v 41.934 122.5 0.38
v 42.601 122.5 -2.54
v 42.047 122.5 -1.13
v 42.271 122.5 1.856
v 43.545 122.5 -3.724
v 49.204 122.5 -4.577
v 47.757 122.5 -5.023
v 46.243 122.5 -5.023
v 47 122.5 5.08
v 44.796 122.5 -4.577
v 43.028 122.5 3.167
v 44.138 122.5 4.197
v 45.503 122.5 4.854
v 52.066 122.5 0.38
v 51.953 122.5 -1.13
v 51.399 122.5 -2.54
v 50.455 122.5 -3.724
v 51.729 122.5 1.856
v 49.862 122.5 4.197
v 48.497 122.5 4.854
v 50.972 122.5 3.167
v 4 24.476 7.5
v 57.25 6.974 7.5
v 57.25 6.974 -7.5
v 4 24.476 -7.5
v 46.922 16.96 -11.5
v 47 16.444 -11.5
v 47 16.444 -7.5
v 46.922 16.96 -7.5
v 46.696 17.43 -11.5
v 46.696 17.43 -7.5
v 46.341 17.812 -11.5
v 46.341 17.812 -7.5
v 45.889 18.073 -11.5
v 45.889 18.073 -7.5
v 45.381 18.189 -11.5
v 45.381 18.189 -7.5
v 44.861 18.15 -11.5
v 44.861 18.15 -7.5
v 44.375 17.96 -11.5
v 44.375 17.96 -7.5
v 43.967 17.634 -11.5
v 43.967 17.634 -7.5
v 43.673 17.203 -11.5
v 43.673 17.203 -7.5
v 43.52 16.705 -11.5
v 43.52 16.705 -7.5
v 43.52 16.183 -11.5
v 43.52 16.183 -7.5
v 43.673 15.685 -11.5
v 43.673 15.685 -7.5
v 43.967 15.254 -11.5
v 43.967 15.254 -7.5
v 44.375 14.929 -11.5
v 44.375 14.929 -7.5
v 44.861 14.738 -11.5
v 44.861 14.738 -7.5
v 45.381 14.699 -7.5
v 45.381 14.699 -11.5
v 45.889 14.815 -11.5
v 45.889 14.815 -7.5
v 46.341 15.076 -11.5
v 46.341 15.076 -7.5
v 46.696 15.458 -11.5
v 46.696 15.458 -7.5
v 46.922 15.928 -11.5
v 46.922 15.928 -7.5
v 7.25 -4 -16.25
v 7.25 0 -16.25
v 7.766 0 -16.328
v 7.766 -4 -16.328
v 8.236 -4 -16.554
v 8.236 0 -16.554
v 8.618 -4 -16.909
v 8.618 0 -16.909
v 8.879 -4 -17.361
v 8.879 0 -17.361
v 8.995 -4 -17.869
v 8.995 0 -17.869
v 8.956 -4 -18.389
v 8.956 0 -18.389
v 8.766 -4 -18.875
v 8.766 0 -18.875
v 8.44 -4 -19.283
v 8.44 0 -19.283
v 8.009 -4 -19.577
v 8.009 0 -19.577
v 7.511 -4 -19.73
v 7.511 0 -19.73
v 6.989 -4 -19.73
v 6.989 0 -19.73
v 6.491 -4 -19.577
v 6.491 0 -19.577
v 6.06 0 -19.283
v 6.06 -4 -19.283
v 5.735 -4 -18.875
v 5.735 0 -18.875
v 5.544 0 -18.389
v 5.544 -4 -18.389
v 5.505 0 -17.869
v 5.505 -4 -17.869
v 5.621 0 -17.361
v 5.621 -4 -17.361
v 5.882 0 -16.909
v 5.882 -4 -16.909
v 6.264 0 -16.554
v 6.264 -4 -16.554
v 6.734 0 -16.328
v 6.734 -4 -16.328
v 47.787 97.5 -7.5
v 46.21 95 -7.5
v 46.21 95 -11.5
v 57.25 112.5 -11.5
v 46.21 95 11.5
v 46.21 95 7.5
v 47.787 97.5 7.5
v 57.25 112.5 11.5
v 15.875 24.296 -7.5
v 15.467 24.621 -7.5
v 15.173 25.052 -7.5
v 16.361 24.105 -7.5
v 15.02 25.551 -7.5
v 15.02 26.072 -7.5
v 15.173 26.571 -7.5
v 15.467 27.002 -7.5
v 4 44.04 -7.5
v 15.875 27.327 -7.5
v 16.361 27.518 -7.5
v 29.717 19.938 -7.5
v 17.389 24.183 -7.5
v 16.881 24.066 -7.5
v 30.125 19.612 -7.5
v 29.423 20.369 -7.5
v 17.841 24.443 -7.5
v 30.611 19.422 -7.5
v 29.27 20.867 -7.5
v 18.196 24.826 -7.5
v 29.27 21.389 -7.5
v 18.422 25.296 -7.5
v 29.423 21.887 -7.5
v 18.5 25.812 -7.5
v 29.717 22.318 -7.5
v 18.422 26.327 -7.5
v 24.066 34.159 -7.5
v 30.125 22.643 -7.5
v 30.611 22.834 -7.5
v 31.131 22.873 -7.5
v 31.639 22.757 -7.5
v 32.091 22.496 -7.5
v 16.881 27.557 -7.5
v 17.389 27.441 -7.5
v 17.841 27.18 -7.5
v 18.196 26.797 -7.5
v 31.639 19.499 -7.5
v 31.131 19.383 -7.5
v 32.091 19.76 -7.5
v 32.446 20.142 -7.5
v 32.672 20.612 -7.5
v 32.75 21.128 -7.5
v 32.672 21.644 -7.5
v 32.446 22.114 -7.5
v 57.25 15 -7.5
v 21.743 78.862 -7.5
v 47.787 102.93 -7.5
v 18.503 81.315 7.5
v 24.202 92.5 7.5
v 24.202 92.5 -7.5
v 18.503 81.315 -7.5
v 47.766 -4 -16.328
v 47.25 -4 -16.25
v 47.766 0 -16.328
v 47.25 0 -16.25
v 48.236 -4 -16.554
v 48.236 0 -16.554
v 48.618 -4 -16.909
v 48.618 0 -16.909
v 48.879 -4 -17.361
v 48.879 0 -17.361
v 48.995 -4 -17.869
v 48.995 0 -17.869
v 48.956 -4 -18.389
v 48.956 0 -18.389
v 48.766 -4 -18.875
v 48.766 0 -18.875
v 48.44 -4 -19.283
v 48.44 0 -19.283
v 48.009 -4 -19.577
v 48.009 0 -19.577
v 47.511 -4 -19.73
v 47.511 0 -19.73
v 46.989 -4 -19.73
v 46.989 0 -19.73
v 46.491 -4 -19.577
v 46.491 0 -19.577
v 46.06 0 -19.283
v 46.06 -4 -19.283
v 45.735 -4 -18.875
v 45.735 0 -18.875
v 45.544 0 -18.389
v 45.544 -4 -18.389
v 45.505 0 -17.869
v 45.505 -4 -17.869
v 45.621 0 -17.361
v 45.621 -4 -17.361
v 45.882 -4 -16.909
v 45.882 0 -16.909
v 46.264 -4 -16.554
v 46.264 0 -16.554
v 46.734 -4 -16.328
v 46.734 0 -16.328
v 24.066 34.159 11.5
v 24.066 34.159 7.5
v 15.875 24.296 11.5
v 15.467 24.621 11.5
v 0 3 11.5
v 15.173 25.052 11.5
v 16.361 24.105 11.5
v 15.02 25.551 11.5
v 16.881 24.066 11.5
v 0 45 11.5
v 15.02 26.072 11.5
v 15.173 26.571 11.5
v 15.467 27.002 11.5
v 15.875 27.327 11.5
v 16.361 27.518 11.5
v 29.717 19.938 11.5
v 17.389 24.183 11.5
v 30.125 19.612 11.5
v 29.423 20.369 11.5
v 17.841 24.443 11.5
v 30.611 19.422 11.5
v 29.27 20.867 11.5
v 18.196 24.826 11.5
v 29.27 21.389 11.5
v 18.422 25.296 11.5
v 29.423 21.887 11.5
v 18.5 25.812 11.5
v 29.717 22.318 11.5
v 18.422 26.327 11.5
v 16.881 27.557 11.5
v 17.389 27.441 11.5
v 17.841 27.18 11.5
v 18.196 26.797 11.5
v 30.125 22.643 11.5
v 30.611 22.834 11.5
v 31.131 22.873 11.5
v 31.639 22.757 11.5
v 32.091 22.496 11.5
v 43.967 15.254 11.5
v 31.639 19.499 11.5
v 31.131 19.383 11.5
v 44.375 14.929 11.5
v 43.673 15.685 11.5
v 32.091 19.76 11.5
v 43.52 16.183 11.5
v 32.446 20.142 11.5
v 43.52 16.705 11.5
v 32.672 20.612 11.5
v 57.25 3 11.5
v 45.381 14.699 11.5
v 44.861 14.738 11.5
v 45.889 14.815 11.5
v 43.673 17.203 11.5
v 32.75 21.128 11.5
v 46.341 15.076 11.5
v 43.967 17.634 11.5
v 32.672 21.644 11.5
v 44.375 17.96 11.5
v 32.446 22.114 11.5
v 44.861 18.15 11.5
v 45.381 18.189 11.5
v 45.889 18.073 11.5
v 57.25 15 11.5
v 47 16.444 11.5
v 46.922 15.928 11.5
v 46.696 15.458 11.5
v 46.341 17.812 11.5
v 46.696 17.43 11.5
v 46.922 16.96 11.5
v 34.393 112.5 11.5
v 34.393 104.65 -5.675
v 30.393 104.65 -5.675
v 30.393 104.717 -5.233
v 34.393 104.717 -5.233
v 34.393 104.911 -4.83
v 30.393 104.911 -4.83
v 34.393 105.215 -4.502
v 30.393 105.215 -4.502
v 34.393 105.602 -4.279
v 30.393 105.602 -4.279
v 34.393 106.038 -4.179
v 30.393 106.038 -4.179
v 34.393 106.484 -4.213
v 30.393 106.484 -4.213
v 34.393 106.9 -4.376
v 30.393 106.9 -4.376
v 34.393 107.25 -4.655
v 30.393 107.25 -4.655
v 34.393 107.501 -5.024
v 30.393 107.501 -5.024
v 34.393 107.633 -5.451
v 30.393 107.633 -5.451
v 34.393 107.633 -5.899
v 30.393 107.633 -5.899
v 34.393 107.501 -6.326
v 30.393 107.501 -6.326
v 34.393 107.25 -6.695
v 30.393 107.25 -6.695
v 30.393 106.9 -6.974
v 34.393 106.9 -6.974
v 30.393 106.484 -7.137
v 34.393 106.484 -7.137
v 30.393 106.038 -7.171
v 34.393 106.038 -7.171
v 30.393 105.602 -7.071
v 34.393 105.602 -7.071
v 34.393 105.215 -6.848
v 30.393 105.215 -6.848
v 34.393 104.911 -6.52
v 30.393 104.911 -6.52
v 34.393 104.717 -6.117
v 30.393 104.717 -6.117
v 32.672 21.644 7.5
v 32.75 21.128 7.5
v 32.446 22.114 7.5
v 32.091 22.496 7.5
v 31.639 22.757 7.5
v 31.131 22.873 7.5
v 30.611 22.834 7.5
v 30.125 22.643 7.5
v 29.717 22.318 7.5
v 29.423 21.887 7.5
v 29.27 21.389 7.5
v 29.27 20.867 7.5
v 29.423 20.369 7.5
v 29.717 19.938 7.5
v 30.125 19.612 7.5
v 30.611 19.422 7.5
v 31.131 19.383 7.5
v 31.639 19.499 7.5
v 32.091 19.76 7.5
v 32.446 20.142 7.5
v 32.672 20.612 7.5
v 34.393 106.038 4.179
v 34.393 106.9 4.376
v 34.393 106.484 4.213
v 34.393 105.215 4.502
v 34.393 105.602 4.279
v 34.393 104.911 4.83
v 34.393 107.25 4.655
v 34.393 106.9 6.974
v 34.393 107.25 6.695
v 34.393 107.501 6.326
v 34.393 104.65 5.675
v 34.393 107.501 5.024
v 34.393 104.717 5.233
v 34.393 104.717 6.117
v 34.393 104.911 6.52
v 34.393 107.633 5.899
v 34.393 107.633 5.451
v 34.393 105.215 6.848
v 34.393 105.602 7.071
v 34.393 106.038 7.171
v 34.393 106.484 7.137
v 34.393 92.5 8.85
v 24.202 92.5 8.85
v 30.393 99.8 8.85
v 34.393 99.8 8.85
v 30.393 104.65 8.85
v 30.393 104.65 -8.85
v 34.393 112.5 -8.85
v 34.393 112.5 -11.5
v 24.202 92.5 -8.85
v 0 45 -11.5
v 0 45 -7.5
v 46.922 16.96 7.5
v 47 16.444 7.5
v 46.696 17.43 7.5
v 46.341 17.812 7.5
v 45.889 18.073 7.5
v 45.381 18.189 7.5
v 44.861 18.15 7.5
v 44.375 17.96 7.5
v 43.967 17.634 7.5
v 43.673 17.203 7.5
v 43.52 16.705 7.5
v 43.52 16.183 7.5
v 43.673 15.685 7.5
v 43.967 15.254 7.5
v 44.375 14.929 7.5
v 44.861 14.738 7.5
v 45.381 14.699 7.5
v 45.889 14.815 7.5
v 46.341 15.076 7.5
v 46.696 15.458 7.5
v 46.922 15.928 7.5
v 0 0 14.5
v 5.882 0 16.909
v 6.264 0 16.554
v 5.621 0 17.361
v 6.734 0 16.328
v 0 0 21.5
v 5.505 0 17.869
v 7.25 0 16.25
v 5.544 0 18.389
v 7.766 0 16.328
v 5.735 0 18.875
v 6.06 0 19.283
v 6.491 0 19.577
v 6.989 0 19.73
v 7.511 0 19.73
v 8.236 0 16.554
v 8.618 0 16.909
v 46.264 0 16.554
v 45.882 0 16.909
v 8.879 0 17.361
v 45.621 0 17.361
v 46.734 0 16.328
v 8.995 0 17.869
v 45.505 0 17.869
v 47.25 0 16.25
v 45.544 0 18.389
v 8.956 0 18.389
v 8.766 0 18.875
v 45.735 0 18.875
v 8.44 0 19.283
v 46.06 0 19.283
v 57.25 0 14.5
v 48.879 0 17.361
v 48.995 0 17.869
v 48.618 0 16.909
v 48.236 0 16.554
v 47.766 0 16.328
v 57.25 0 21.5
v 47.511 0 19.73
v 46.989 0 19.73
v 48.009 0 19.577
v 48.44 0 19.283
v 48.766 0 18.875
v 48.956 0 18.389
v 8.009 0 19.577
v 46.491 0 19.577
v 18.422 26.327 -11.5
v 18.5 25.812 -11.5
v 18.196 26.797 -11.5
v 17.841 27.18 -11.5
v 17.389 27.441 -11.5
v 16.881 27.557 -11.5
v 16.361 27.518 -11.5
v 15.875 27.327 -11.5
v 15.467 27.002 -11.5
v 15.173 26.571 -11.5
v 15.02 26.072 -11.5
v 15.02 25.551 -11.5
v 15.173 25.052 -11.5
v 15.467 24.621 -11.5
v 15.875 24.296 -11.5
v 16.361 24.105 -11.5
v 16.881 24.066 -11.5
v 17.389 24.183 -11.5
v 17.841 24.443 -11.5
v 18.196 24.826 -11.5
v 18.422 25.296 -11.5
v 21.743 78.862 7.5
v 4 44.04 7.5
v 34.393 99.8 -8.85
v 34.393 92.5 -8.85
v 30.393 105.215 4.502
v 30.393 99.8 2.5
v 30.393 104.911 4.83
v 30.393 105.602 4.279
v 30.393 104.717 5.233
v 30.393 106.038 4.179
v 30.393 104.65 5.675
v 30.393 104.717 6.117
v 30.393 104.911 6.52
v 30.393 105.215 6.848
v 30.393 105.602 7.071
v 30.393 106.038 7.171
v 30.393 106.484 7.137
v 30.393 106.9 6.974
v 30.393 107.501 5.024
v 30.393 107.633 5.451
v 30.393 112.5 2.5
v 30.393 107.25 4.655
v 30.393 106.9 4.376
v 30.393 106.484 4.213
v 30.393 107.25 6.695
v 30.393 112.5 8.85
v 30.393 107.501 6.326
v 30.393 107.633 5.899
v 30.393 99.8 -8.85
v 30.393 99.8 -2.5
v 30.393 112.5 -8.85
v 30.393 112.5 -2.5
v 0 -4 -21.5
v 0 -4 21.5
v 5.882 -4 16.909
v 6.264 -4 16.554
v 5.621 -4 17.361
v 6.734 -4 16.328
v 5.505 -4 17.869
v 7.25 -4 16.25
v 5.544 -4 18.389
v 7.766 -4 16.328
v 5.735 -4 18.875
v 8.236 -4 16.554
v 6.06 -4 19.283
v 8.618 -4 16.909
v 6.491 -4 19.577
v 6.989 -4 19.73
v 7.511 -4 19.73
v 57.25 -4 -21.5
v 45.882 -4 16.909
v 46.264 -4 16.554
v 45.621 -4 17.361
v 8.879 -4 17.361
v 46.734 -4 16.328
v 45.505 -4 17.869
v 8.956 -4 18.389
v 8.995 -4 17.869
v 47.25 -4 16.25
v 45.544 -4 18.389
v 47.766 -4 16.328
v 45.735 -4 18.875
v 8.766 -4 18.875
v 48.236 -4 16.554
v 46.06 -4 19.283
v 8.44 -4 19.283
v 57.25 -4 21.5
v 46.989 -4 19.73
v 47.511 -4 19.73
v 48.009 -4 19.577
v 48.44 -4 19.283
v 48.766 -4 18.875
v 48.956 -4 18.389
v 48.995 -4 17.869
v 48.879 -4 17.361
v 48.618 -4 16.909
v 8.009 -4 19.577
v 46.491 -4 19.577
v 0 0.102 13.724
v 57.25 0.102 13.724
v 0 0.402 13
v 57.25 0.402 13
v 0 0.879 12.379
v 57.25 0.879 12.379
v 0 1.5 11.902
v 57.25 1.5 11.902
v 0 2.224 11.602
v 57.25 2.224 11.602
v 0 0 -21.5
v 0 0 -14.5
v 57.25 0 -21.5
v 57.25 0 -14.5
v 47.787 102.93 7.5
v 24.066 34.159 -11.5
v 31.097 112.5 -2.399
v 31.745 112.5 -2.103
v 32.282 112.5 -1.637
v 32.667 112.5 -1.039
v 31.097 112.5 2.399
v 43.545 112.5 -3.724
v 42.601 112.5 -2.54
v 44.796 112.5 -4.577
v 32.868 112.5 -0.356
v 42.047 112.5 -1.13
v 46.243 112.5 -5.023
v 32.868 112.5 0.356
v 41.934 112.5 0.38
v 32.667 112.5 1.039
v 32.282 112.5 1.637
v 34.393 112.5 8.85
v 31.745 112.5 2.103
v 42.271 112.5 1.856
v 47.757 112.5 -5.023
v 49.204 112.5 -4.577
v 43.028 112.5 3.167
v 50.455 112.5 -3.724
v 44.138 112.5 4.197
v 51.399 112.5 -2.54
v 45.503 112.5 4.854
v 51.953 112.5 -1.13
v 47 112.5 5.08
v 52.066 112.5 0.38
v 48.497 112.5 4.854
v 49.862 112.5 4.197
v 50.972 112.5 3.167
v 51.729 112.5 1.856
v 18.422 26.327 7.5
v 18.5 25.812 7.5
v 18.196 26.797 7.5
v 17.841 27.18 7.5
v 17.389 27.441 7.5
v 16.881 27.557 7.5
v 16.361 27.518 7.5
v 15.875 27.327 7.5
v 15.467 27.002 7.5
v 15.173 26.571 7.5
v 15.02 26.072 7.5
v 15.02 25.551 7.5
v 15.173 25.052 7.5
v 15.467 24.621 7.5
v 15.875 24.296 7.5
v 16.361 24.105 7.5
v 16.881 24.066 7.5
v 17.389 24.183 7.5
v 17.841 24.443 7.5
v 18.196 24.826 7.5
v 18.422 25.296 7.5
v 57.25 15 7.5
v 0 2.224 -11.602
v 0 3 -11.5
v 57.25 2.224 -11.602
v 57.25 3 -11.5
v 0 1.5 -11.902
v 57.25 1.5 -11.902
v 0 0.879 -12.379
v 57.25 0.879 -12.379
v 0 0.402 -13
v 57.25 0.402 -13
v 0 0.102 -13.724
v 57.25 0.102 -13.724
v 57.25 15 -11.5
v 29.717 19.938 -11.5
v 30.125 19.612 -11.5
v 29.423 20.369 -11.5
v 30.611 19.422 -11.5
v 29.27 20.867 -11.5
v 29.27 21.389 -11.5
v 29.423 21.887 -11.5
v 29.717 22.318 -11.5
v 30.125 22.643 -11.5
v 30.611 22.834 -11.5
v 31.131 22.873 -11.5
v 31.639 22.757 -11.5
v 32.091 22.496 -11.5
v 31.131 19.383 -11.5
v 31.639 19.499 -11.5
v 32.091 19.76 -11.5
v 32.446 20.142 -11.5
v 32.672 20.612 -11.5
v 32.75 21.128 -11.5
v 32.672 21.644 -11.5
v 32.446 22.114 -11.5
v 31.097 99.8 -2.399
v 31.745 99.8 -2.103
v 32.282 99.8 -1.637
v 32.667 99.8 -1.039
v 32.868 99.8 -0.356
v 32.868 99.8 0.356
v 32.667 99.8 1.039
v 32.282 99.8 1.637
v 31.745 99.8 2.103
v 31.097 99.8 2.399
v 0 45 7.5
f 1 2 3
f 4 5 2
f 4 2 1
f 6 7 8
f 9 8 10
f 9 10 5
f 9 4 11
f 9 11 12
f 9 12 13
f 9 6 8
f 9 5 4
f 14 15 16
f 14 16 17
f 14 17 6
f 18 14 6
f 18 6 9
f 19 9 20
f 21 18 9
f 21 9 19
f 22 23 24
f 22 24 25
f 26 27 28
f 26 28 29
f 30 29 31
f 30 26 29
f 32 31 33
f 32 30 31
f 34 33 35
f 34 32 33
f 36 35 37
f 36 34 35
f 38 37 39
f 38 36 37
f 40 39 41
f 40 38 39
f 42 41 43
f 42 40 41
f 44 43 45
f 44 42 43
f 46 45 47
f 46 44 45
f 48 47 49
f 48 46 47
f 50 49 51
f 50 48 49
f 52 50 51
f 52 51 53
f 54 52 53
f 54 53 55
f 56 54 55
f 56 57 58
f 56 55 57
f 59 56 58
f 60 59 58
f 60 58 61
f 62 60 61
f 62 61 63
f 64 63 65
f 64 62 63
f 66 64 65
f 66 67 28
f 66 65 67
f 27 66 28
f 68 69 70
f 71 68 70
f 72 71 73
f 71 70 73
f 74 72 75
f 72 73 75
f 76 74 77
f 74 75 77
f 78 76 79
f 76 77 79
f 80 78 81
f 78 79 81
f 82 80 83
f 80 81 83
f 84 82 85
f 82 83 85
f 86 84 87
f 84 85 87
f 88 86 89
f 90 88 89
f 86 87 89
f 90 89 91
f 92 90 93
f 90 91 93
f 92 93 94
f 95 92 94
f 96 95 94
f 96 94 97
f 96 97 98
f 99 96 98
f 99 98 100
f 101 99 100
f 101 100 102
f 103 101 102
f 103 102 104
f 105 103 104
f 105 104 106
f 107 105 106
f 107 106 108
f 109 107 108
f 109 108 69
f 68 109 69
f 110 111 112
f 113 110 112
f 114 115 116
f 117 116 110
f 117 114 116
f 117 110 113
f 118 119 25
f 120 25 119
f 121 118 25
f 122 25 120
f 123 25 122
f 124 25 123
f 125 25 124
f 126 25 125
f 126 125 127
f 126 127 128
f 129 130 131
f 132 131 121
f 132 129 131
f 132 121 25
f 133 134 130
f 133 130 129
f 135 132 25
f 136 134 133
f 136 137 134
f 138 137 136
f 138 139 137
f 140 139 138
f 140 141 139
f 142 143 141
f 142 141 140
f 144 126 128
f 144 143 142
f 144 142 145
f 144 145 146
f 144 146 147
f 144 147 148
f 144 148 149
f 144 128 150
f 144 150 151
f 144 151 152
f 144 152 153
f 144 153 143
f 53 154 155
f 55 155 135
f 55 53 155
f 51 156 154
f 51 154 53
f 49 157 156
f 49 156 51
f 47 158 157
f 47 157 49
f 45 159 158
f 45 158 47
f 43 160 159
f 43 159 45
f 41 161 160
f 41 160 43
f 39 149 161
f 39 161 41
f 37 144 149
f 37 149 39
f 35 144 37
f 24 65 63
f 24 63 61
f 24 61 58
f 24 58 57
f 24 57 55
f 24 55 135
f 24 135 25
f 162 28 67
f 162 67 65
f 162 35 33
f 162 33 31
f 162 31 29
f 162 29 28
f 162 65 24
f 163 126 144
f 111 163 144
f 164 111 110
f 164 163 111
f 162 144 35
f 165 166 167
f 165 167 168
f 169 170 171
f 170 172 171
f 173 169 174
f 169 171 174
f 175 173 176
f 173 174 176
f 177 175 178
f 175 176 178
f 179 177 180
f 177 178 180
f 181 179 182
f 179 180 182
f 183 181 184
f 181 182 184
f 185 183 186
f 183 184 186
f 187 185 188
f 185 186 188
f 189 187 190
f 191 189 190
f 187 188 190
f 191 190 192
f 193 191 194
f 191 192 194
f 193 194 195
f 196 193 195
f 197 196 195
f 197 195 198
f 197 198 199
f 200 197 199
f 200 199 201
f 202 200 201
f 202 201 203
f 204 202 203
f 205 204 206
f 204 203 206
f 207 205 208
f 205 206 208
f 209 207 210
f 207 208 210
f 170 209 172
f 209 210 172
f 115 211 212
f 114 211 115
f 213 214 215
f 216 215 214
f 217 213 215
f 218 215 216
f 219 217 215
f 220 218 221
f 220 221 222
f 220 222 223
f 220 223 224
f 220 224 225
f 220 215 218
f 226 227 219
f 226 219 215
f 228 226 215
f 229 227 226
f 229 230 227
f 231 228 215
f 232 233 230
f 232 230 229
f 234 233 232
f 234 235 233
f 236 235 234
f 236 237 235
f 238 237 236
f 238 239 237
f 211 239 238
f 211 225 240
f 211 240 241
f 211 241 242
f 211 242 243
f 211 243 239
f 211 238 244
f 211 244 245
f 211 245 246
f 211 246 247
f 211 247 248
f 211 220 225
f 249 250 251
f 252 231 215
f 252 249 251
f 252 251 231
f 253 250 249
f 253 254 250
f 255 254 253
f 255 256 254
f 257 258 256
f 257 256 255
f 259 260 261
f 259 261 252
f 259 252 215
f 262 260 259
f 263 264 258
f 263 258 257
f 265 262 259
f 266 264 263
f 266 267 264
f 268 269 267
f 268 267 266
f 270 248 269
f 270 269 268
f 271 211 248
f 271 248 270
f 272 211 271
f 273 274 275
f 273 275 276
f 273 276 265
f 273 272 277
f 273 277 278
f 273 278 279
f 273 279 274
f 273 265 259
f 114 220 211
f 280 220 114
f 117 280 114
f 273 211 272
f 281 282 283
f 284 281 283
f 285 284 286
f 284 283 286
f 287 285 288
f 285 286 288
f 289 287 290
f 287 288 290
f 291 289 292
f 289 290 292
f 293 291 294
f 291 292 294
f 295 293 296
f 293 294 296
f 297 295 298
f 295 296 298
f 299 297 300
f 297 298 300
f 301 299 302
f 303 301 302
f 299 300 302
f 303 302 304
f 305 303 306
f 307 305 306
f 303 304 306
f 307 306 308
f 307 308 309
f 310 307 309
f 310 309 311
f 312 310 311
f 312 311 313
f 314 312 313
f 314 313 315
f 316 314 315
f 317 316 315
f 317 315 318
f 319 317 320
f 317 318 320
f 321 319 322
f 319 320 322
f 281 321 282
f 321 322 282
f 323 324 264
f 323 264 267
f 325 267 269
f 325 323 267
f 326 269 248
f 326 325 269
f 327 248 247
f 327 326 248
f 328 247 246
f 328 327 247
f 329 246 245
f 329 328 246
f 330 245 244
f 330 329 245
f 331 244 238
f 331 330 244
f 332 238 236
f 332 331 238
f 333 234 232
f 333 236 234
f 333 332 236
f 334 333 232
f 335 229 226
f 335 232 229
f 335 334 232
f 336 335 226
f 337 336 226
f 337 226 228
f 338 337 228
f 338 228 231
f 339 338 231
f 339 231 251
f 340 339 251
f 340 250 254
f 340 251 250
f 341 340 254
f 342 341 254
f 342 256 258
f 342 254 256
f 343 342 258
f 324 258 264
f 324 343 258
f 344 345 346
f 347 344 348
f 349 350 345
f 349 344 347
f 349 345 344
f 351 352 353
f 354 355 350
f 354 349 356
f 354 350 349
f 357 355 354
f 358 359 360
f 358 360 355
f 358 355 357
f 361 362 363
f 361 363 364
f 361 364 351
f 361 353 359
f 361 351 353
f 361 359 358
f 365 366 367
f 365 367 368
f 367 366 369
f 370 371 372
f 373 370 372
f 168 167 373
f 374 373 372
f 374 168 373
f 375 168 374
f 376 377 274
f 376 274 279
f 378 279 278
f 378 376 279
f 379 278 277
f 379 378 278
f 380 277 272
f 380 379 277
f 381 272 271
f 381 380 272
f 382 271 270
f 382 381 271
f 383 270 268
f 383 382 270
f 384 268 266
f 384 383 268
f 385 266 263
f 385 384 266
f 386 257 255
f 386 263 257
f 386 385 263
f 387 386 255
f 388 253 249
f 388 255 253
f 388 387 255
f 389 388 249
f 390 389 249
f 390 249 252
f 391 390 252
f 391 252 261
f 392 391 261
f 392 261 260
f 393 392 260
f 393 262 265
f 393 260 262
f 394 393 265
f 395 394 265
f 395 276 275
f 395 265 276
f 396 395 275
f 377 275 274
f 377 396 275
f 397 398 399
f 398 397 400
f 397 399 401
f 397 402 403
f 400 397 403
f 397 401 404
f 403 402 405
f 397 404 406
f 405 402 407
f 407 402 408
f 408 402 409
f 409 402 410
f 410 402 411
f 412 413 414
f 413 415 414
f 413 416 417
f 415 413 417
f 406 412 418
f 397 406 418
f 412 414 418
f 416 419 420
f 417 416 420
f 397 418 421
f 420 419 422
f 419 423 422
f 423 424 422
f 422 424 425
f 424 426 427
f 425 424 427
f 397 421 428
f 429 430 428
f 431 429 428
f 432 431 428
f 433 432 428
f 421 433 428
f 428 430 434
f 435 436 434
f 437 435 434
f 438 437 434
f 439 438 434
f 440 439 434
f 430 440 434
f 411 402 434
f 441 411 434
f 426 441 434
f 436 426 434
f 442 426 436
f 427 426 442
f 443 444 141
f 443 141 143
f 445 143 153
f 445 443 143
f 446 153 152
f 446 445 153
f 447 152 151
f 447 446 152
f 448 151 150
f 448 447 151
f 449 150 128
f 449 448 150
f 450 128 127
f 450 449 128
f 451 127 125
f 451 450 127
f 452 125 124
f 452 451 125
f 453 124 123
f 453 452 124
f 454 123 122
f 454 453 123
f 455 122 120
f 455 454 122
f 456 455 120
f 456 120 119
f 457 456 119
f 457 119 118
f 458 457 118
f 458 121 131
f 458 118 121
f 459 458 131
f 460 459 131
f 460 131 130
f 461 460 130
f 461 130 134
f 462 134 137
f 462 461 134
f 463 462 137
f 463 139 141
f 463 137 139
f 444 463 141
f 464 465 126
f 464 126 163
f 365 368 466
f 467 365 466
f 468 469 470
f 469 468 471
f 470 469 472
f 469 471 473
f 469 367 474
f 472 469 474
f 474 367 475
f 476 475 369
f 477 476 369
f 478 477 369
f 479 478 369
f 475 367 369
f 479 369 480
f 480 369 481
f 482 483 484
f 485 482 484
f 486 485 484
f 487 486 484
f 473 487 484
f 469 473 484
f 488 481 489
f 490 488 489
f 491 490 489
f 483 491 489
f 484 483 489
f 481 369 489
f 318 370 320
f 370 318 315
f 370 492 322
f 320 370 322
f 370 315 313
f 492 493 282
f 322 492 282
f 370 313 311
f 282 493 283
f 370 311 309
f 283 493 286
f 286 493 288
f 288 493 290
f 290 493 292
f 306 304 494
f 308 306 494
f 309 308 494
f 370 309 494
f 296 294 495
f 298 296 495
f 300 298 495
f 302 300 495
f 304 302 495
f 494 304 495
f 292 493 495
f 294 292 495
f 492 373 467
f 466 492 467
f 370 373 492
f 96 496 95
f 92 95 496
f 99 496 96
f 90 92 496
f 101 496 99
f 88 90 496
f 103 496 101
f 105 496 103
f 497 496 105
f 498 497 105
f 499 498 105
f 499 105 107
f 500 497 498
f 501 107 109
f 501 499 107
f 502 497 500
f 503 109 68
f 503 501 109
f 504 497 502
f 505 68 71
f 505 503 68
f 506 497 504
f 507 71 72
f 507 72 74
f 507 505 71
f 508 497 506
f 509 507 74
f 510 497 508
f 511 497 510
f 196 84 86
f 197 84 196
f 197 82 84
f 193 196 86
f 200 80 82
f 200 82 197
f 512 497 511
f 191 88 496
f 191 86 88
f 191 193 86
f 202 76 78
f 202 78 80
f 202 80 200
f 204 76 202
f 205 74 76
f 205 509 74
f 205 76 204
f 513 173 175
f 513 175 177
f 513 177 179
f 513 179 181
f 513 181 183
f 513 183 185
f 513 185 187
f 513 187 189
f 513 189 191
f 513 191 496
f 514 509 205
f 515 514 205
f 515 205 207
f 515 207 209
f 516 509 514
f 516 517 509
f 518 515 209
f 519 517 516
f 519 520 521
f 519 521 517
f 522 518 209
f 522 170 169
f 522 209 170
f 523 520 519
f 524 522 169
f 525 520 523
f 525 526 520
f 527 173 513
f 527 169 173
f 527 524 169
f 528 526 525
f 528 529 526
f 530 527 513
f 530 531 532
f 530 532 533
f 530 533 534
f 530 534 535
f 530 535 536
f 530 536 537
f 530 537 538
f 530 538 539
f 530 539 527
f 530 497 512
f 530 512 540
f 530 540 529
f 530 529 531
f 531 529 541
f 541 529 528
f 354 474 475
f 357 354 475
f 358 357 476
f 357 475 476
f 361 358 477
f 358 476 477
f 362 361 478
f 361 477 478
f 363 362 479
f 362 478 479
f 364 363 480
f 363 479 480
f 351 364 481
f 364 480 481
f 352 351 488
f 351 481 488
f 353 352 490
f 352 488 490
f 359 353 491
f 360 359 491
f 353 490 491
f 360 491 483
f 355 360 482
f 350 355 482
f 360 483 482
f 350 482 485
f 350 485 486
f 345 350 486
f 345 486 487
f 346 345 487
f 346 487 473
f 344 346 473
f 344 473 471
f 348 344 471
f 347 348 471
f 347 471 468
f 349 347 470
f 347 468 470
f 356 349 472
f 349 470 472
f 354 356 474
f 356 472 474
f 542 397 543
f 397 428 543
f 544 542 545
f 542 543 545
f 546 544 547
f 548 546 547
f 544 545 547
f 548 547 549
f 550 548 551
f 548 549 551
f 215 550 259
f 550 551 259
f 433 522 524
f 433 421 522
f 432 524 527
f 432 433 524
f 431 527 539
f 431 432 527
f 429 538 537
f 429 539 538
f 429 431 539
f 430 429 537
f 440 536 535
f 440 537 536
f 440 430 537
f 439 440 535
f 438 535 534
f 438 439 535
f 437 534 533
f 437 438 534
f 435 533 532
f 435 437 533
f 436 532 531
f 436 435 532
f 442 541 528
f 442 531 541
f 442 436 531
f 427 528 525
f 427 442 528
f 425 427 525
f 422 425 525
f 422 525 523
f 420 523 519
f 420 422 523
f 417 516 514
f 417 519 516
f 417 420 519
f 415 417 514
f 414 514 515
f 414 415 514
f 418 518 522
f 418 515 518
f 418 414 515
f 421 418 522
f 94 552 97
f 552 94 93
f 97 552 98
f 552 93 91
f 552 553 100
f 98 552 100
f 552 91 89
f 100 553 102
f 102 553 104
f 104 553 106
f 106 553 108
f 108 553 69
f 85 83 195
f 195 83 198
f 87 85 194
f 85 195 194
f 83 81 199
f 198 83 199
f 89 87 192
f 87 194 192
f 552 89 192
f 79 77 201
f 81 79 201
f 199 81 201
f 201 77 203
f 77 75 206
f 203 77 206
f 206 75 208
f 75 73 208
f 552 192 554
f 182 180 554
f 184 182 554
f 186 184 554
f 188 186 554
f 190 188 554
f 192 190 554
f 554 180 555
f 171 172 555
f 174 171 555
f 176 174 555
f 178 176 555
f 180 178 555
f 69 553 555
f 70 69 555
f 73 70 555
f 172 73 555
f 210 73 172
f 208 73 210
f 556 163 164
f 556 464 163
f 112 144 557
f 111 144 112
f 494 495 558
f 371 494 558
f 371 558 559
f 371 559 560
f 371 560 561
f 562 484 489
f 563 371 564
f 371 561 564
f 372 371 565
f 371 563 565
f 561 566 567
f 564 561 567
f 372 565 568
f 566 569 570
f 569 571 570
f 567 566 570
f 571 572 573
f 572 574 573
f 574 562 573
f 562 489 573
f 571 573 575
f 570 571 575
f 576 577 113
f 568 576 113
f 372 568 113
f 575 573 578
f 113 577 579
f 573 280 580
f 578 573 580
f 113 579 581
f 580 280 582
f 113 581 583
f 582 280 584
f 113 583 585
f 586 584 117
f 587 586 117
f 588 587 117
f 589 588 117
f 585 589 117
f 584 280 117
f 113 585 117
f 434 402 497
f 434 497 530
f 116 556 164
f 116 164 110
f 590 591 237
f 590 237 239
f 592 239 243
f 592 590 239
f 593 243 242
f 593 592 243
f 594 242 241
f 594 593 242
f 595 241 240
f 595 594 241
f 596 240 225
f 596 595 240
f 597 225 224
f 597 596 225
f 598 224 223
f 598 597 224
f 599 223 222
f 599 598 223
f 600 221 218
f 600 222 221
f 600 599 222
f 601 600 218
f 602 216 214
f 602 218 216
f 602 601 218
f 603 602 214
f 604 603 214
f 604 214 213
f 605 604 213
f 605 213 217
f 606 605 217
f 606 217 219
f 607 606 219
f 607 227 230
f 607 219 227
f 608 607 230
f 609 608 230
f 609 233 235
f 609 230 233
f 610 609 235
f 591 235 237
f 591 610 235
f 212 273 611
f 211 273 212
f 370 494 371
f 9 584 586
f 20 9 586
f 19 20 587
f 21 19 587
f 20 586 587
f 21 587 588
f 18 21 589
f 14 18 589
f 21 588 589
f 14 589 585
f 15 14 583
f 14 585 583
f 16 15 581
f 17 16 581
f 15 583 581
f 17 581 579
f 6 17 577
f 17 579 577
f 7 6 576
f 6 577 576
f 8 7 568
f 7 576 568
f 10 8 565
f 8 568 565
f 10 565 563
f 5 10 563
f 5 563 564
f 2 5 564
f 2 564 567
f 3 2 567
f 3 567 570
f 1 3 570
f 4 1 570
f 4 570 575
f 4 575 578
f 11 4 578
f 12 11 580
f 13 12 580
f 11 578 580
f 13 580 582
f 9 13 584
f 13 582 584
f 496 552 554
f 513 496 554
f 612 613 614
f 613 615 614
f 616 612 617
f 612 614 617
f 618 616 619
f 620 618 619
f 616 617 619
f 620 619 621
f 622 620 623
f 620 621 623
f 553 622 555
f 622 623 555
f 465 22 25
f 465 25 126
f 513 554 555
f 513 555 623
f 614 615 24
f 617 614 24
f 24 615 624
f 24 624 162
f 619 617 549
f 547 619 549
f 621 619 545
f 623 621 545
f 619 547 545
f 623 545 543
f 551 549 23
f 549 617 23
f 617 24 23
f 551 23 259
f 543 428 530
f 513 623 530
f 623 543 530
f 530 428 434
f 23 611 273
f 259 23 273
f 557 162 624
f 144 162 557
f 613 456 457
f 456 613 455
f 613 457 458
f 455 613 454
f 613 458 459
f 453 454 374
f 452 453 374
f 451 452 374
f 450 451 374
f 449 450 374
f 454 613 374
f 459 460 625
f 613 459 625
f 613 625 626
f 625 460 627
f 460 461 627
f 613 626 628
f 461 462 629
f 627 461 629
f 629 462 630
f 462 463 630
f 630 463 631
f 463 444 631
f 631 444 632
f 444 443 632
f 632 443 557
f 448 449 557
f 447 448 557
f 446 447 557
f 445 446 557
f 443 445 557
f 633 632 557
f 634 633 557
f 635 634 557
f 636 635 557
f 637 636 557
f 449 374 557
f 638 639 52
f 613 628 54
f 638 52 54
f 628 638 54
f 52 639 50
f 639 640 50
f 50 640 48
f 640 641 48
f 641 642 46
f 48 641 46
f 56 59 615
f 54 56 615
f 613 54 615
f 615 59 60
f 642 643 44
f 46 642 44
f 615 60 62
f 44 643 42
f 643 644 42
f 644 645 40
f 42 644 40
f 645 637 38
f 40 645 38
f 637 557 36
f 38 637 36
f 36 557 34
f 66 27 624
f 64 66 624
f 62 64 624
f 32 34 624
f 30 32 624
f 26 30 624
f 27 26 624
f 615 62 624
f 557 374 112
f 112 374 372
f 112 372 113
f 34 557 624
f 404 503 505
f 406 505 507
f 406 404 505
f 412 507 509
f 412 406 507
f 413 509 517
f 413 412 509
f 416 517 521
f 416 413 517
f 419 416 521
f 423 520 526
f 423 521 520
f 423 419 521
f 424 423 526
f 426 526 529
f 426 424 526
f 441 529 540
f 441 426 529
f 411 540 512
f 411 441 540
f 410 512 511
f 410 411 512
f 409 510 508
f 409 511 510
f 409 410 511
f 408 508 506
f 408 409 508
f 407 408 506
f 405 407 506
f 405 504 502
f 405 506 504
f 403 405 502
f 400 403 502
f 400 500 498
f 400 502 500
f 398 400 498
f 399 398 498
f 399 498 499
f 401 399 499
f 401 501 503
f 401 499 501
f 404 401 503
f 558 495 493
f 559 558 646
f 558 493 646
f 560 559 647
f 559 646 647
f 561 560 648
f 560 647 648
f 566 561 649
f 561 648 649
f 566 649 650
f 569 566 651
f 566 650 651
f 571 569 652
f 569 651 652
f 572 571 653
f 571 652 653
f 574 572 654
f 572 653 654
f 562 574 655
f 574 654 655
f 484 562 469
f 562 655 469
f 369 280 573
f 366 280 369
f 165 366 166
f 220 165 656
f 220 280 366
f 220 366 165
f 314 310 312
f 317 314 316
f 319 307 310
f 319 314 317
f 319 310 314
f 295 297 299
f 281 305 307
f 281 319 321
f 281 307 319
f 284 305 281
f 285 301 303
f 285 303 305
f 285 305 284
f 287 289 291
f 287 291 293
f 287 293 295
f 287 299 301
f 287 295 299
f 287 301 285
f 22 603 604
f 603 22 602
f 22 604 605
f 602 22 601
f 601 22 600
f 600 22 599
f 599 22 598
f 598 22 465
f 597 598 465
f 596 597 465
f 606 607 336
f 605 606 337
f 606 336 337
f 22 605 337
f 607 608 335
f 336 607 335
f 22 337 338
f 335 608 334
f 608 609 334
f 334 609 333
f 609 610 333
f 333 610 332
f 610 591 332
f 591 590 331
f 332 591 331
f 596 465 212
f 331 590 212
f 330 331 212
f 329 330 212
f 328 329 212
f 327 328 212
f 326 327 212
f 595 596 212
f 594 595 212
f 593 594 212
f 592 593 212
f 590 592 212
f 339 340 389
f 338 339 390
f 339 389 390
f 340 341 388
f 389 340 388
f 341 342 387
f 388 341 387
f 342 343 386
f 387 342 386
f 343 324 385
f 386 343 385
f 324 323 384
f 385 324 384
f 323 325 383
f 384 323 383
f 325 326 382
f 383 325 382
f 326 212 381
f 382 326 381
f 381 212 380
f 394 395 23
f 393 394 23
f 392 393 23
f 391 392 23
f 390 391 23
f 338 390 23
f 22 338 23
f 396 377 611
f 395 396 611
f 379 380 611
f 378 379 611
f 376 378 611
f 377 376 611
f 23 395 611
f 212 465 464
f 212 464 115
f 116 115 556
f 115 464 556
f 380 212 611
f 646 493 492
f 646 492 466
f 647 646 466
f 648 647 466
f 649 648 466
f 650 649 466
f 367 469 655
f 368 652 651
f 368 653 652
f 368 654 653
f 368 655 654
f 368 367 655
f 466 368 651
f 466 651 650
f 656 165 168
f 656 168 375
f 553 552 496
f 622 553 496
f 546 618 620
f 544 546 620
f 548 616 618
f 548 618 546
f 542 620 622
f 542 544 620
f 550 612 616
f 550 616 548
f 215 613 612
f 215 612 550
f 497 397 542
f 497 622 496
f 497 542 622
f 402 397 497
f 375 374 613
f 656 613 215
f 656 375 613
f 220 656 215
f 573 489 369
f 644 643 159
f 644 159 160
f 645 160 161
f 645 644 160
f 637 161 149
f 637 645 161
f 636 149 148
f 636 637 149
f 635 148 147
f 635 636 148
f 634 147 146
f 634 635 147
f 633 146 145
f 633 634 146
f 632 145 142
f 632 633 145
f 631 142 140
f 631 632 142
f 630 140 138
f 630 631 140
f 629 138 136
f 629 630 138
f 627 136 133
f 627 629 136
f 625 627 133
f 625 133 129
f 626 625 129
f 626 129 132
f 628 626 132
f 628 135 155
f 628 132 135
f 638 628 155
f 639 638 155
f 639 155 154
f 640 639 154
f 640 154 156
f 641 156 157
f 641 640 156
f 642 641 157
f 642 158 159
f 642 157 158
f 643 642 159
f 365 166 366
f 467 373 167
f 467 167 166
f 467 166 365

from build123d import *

# Parameters (mm, degrees)
BOSS_EXTRUDE1_DEPTH     = 11.5
SKETCH2_OUTSIDE_W       = 84.912
SKETCH2_OUTSIDE_H       = 140.162
CUT_EXTRUDE2_DEPTH      = 7.5
CUT_EXTRUDE3_DEPTH      = 129.307516771
CUT_EXTRUDE3_DEPTH_BACK = 129.307516771
SKETCH4_R               = 1.75
SKETCH5_W               = 57.250055546
SKETCH5_H               = 43
BOSS_EXTRUDE2_DEPTH     = 4
SKETCH6_R               = 1.75
CUT_EXTRUDE4_DEPTH      = 129.047135306
FILLET1_R               = 3
SKETCH7_R               = 5.08
BOSS_EXTRUDE3_DEPTH     = 10
SKETCH11_W              = 13
SKETCH11_H              = 17.7
CUT_EXTRUDE7_DEPTH      = 20
SKETCH8_W               = 4
SKETCH8_H               = 12.7
BOSS_EXTRUDE4_DEPTH     = 8.85
SKETCH9_R               = 2.5
CUT_EXTRUDE5_DEPTH      = 116.967836159
SKETCH10_R              = 1.5
CUT_EXTRUDE6_DEPTH      = 4


with BuildPart() as part:
    # Sketch1 → Boss-Extrude1 (new, symmetric)
    with BuildSketch(Plane.XY):
        Polygon((0, 45), (0, 0), (57.250055546, 0), (57.250055546, 15), (24.066011022, 34.158817039), (46.210390637, 95), (57.250055546, 112.5), (34.392967841, 112.5), align=None)
    extrude(amount=BOSS_EXTRUDE1_DEPTH, both=True)

    # Sketch2 outside → Cut-Extrude2 (cut, symmetric)
    with BuildSketch(Plane.XY):
        with Locations((28.625, 56.25)):
            Rectangle(SKETCH2_OUTSIDE_W, SKETCH2_OUTSIDE_H)
        Polygon((4, 44.039684964), (21.742887775, 78.862062909), (47.787485624, 102.92976146), (47.787485624, 97.5), (57.250055546, 112.5), (52.250055546, 112.5), (18.50330035, 81.314771653), (0, 45), (0, 0), (57.250055546, 0), (57.250055546, 6.97368477), (4, 24.475940791), align=None, mode=Mode.SUBTRACT)
        Polygon((18.50330035, 81.314771653), (52.250055546, 112.5), (34.392967841, 112.5), align=None, mode=Mode.SUBTRACT)
    extrude(amount=CUT_EXTRUDE2_DEPTH, both=True, mode=Mode.SUBTRACT)

    # Sketch4 → Cut-Extrude3 (cut, two sides: drawn at the far end of the back side and taken through both)
    with BuildSketch(Plane.XY.offset(11.5).offset(-CUT_EXTRUDE3_DEPTH_BACK)):
        with Locations((45.250055546, 16.444166257)):
            Circle(SKETCH4_R)
        with Locations((31.000040397, 21.127868666)):
            Circle(SKETCH4_R)
        with Locations((16.750025248, 25.811571075)):
            Circle(SKETCH4_R)
    extrude(amount=CUT_EXTRUDE3_DEPTH + CUT_EXTRUDE3_DEPTH_BACK, mode=Mode.SUBTRACT)

    # Sketch5 → Boss-Extrude2 (add)
    with BuildSketch(Plane.XZ):
        with Locations((28.625027773, 0)):
            Rectangle(SKETCH5_W, SKETCH5_H)
    extrude(amount=BOSS_EXTRUDE2_DEPTH)

    # Sketch6 → Cut-Extrude4 (cut, symmetric)
    with BuildSketch(Plane(origin=(0, 0, 0), x_dir=(1, 0, 0), z_dir=(0, 1, 0))):
        with Locations(Location((7.250055546, 18, 0), (0, 0, 270))):
            Circle(SKETCH6_R)
        with Locations(Location((47.250055546, 18, 0), (0, 0, 270))):
            Circle(SKETCH6_R)
    cut_extrude4 = extrude(amount=CUT_EXTRUDE4_DEPTH, both=True, mode=Mode.SUBTRACT)

    # Mirror5: Cut-Extrude4 across plane
    add(cut_extrude4.mirror(Plane.XY), mode=Mode.SUBTRACT)

    # Fillet1
    fillet1_edges = [part.edges().sort_by_distance(p)[0] for p in [
        (28.625027773, 0, 11.5),
        (28.625027773, 0, -11.5),
    ]]
    fillet(fillet1_edges, radius=FILLET1_R)

    # Sketch7 → Boss-Extrude3 (add)
    with BuildSketch(Plane(origin=(0, 112.5, 0), x_dir=(1, 0, 0), z_dir=(0, 1, 0))):
        with Locations(Location((47.000055546, 0, 0), (0, 0, 270))):
            Circle(SKETCH7_R)
    extrude(amount=BOSS_EXTRUDE3_DEPTH)

    # Sketch11 → Cut-Extrude7 (cut)
    with BuildSketch(Plane(origin=(0, 112.5, 0), x_dir=(1, 0, 0), z_dir=(0, 1, 0))):
        with Locations((27.892967841, 0)):
            Rectangle(SKETCH11_W, SKETCH11_H)
    extrude(amount=-CUT_EXTRUDE7_DEPTH, mode=Mode.SUBTRACT)

    # Sketch8 → Boss-Extrude4 (add, symmetric)
    with BuildSketch(Plane.XY):
        with Locations((32.392967841, 106.15)):
            Rectangle(SKETCH8_W, SKETCH8_H)
    extrude(amount=BOSS_EXTRUDE4_DEPTH, both=True)

    # Sketch9 → Cut-Extrude5 (cut, through all)
    with BuildSketch(Plane(origin=(47.030298994, 99.8, 0), x_dir=(-1, 0, 0), z_dir=(0, -1, 0))):
        with Locations((16.637331153, 0)):
            Circle(SKETCH9_R)
    extrude(amount=-CUT_EXTRUDE5_DEPTH, mode=Mode.SUBTRACT)

    # Sketch10 → Cut-Extrude6 (cut)
    with BuildSketch(Plane(origin=(30.392967841, -1.431684556, 0), x_dir=(0, 0, 1), z_dir=(-1, 0, 0))):
        with Locations(Location((-5.675, 107.581684556, 0), (0, 0, 270))):
            Circle(SKETCH10_R)
        with Locations(Location((5.675, 107.581684556, 0), (0, 0, 270))):
            Circle(SKETCH10_R)
    extrude(amount=-CUT_EXTRUDE6_DEPTH, mode=Mode.SUBTRACT)


solid = part.part
